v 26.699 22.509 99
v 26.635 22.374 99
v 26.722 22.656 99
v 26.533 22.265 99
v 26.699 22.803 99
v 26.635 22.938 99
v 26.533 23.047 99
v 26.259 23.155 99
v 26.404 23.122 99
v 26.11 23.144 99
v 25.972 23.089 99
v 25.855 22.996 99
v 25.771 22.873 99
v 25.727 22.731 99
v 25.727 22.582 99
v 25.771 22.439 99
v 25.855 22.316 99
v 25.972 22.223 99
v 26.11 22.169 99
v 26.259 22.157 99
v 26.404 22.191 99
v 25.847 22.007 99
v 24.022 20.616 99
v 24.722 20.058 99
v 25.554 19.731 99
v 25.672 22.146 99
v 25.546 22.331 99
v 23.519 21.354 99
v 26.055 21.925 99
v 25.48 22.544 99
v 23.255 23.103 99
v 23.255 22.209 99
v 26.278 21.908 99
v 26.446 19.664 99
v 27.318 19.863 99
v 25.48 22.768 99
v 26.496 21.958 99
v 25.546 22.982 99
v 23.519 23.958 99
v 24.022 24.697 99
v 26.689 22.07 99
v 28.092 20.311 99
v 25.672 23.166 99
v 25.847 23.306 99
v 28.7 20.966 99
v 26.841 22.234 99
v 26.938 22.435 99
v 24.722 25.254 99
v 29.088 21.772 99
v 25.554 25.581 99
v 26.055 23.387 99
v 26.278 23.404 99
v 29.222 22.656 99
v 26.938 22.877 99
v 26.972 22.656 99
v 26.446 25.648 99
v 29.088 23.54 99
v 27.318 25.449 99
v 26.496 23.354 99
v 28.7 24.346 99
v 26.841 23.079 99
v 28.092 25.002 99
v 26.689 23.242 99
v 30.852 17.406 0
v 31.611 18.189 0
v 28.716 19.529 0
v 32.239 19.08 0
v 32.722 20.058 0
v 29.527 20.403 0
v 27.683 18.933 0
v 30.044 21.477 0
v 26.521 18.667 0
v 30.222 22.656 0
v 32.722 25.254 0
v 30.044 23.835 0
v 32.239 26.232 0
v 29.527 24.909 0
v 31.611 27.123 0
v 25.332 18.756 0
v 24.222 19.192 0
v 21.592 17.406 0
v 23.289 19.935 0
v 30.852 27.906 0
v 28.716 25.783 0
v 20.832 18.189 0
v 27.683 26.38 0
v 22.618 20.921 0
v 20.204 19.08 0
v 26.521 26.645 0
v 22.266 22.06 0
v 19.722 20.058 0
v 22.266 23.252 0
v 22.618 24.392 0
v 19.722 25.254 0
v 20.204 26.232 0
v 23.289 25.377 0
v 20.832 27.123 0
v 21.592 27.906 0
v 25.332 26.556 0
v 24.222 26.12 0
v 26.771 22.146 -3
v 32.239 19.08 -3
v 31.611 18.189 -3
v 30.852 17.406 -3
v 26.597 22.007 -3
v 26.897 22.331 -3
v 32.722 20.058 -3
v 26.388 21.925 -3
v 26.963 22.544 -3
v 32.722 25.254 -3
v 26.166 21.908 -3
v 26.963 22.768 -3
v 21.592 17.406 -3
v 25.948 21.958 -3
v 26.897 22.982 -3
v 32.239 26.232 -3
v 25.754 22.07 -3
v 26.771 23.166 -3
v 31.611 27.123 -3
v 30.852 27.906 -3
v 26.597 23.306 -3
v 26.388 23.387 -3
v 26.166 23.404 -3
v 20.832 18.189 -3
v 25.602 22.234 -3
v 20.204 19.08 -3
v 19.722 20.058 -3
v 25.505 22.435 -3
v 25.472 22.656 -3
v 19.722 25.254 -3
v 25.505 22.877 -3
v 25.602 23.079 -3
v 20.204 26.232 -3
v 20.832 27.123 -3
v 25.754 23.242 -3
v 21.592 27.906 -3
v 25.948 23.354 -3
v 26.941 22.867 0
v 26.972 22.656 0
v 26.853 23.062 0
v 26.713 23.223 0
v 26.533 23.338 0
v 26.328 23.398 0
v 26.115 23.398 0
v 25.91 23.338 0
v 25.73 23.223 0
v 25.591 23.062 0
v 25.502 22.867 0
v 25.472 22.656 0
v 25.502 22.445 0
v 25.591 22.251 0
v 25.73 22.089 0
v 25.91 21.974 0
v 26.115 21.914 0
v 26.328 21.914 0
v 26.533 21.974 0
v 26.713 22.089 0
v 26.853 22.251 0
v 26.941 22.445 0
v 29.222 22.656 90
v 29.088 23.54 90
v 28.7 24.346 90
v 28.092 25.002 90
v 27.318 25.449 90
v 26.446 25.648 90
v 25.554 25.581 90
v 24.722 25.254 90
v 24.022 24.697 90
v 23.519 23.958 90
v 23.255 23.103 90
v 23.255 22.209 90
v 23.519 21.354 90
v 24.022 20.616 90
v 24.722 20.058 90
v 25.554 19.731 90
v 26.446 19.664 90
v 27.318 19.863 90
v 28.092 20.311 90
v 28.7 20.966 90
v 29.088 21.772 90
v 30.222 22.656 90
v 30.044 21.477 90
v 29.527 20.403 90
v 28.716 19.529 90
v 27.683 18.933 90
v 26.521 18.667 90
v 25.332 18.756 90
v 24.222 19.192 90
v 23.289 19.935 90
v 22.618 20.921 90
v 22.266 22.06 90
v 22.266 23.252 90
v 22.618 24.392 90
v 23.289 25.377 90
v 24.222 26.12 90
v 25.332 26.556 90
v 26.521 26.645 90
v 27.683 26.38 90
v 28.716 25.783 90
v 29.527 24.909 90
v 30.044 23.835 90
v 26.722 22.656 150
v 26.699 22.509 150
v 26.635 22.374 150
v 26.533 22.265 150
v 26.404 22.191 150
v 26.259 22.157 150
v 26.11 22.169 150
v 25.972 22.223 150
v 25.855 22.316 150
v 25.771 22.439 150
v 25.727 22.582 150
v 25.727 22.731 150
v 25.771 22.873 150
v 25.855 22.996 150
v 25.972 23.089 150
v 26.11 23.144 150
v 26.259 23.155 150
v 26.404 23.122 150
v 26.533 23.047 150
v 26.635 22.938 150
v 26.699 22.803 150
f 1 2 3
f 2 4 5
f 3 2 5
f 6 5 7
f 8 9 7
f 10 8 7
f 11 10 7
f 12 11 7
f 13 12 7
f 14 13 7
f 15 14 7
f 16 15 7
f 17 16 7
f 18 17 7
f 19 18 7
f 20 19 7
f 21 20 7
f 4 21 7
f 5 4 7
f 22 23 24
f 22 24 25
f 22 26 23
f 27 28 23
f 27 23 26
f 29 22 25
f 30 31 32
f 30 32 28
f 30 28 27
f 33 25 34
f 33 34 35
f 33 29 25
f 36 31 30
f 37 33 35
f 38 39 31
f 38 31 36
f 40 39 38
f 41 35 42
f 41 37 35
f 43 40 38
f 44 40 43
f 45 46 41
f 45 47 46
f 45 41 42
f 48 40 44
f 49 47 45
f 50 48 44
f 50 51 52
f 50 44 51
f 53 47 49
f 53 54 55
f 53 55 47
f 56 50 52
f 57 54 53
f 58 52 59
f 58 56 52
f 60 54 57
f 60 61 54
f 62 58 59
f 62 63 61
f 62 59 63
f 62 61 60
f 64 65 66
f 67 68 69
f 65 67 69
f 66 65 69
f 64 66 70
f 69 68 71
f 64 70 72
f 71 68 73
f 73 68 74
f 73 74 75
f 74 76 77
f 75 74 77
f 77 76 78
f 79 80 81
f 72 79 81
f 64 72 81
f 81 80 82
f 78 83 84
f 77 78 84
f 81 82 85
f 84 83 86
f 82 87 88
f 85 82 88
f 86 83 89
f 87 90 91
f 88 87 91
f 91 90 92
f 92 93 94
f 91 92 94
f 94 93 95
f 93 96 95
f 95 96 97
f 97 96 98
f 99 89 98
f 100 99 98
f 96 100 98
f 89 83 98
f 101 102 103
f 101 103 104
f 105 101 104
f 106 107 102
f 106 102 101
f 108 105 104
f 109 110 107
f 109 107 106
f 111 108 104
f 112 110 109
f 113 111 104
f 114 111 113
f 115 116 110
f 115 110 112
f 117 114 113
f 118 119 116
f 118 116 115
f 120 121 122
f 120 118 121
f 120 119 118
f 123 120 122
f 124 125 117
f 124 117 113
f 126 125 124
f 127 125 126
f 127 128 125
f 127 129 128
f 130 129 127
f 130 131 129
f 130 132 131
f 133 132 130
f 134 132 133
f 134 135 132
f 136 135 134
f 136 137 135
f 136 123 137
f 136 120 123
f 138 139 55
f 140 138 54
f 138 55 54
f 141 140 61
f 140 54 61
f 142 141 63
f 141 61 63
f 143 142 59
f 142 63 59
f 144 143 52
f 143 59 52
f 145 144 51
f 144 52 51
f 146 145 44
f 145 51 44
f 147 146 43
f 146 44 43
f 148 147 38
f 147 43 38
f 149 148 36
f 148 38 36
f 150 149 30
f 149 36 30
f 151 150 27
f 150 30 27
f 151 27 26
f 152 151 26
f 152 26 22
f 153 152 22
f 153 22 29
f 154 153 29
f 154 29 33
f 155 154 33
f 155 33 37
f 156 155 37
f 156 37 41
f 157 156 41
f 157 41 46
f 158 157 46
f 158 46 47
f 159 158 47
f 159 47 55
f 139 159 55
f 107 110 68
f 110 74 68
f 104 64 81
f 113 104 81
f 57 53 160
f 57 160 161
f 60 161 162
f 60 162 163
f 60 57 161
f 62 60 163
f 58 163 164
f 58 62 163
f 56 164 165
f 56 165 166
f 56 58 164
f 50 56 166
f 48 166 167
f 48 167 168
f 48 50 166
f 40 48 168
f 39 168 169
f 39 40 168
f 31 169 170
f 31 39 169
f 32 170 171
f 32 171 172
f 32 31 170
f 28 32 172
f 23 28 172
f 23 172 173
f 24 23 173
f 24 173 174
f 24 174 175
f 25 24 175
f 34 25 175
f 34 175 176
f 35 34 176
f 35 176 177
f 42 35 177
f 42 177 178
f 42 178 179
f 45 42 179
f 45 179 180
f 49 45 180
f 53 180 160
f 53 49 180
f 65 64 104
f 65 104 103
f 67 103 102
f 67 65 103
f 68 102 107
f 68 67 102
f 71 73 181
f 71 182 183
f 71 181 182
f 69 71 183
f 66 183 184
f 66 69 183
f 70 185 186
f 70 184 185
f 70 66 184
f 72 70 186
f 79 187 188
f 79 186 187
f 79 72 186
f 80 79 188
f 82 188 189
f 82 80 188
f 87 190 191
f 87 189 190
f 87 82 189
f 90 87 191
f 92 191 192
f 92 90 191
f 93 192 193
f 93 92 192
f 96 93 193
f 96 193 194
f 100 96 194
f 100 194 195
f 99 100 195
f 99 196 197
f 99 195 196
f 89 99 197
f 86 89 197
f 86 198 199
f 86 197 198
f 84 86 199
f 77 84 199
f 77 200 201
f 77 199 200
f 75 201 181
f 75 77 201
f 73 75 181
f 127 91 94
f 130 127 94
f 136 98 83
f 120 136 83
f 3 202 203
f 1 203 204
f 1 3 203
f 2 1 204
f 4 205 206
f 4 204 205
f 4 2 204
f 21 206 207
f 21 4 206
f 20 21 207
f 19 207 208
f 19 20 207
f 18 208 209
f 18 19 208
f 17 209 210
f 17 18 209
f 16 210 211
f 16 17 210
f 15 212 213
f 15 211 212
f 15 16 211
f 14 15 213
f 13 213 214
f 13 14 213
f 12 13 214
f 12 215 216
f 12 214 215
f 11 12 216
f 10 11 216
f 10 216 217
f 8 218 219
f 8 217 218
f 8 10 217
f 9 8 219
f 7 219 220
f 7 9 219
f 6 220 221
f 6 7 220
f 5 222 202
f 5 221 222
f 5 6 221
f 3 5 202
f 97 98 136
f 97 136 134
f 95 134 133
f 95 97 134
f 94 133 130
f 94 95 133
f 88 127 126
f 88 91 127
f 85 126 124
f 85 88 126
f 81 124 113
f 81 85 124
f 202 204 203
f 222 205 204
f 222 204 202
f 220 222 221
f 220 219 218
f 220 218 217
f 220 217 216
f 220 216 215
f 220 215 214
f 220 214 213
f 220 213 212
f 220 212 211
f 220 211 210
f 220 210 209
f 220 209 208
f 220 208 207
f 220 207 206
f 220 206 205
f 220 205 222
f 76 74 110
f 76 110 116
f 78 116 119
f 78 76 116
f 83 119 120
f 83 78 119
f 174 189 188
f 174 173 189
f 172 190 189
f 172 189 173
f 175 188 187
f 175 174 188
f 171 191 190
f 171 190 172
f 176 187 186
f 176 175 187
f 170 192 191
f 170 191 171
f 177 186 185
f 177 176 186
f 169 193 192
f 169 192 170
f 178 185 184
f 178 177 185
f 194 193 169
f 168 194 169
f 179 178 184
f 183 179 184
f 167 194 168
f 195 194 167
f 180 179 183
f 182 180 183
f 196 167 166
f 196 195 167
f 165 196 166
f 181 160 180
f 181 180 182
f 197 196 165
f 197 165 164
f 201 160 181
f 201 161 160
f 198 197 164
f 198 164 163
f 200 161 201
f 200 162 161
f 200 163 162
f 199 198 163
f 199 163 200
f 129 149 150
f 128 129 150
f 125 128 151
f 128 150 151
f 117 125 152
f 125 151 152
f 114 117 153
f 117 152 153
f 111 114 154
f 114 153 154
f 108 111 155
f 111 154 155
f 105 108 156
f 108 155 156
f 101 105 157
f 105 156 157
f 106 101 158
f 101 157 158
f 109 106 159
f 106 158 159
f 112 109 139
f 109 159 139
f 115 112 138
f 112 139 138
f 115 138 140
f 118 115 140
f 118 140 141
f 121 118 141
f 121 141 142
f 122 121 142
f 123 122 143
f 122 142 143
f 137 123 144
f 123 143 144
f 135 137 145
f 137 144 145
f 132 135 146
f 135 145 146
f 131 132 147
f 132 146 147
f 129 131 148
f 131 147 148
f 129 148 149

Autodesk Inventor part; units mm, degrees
ref_plane "YZ Plane" through (0, 0, 0) normal (1, 0, 0) x (0, 1, 0)
ref_plane "XZ Plane" through (0, 0, 0) normal (0, 1, 0) x (-1, 0, 0)
ref_plane "XY Plane" through (0, 0, 0) normal (0, 0, 1) x (1, 0, 0)
sketch "Sketch1" plane through (0, 0, 0) normal (0, 0, 1) x (1, 0, 0)
  circle A0 centre (26.2216, 22.6561) radius 4
  point P0 (0, 0)
  dimension "d0" = 8
extrude "Extrusion1" add sketch "Sketch1" along normal blind 99
sketch "Sketch2" plane through (26.2216, 22.6561, 99) normal (0, 0, 1) x (1, 0, 0)
  circle A0 centre (0, 0) radius 4 projected
  circle A1 centre (0, 0) radius 3
  point P0 (-26.2216, -22.6561)
  dimension "d3" = 6
extrude "Extrusion2" cut sketch "Sketch2" against normal blind 9
sketch "Sketch3" plane through (26.2216, 22.6561, 99) normal (0, 0, 1) x (1, 0, 0)
  circle A0 centre (0, 0) radius 0.75
  point P0 (-26.2216, -22.6561)
  dimension "d6" = 1.5
extrude "Extrusion3" cut sketch "Sketch3" against normal through all
sketch "Sketch5" plane through (26.2216, 22.6561, 99) normal (0, 0, 1) x (1, 0, 0)
  circle A0 centre (0, 0) radius 0.75 projected
  circle A1 centre (0, 0) radius 0.5
  point P0 (-26.2216, -22.6561)
  dimension "d9" = 1
extrude "Extrusion4" add sketch "Sketch5" along normal blind 51 contours A1
sketch "Sketch6" plane through (26.2216, 22.6561, 0) normal (0, 0, -1) x (-1, 0, 0)
  circle A0 centre (0, 0) radius 4 projected
  line L0 (-6.5, -5.25) -> (6.5, -5.25)
  line L1 (6.5, -5.25) -> (6.5, 5.25)
  line L2 (6.5, 5.25) -> (-6.5, 5.25)
  line L3 (-6.5, 5.25) -> (-6.5, -5.25)
  circle A1 centre (0, 0) radius 0.75 projected
  line L4 (-6.5, -5.25) -> (6.5, 5.25) construction
  line L5 (6.5, -5.25) -> (-6.5, 5.25) construction
  circle A2 centre (0, 0) radius 7
  point P0 (26.2216, -22.6561)
  point P1 (-4.6301, -5.25)
  point P2 (-6.5, -2.5981)
  point P3 (-6.5, 2.5981)
  point P4 (-4.6301, 5.25)
  point P5 (4.6301, 5.25)
  point P6 (6.5, 2.5981)
  point P7 (6.5, -2.5981)
  point P8 (4.6301, -5.25)
  dimension "d12" = 13
  dimension "d13" = 10.5
  dimension "d16" = 14
extrude "Extrusion5" add sketch "Sketch6" along normal blind 3 contours A0 | L3 A2 L0 | A2 L3 L2 L1 L0 | A2 L1 L0 | L3 L2 A2 | A2 L2 L1
extrude "Extrusion6" cut sketch "Sketch6" along normal blind 3 contours L3 A2 L0 | A2 L1 L0 | L3 L2 A2 | A2 L2 L1
properties part number "hamilton 100micl syringe body (no plunger)" material "Glass"
